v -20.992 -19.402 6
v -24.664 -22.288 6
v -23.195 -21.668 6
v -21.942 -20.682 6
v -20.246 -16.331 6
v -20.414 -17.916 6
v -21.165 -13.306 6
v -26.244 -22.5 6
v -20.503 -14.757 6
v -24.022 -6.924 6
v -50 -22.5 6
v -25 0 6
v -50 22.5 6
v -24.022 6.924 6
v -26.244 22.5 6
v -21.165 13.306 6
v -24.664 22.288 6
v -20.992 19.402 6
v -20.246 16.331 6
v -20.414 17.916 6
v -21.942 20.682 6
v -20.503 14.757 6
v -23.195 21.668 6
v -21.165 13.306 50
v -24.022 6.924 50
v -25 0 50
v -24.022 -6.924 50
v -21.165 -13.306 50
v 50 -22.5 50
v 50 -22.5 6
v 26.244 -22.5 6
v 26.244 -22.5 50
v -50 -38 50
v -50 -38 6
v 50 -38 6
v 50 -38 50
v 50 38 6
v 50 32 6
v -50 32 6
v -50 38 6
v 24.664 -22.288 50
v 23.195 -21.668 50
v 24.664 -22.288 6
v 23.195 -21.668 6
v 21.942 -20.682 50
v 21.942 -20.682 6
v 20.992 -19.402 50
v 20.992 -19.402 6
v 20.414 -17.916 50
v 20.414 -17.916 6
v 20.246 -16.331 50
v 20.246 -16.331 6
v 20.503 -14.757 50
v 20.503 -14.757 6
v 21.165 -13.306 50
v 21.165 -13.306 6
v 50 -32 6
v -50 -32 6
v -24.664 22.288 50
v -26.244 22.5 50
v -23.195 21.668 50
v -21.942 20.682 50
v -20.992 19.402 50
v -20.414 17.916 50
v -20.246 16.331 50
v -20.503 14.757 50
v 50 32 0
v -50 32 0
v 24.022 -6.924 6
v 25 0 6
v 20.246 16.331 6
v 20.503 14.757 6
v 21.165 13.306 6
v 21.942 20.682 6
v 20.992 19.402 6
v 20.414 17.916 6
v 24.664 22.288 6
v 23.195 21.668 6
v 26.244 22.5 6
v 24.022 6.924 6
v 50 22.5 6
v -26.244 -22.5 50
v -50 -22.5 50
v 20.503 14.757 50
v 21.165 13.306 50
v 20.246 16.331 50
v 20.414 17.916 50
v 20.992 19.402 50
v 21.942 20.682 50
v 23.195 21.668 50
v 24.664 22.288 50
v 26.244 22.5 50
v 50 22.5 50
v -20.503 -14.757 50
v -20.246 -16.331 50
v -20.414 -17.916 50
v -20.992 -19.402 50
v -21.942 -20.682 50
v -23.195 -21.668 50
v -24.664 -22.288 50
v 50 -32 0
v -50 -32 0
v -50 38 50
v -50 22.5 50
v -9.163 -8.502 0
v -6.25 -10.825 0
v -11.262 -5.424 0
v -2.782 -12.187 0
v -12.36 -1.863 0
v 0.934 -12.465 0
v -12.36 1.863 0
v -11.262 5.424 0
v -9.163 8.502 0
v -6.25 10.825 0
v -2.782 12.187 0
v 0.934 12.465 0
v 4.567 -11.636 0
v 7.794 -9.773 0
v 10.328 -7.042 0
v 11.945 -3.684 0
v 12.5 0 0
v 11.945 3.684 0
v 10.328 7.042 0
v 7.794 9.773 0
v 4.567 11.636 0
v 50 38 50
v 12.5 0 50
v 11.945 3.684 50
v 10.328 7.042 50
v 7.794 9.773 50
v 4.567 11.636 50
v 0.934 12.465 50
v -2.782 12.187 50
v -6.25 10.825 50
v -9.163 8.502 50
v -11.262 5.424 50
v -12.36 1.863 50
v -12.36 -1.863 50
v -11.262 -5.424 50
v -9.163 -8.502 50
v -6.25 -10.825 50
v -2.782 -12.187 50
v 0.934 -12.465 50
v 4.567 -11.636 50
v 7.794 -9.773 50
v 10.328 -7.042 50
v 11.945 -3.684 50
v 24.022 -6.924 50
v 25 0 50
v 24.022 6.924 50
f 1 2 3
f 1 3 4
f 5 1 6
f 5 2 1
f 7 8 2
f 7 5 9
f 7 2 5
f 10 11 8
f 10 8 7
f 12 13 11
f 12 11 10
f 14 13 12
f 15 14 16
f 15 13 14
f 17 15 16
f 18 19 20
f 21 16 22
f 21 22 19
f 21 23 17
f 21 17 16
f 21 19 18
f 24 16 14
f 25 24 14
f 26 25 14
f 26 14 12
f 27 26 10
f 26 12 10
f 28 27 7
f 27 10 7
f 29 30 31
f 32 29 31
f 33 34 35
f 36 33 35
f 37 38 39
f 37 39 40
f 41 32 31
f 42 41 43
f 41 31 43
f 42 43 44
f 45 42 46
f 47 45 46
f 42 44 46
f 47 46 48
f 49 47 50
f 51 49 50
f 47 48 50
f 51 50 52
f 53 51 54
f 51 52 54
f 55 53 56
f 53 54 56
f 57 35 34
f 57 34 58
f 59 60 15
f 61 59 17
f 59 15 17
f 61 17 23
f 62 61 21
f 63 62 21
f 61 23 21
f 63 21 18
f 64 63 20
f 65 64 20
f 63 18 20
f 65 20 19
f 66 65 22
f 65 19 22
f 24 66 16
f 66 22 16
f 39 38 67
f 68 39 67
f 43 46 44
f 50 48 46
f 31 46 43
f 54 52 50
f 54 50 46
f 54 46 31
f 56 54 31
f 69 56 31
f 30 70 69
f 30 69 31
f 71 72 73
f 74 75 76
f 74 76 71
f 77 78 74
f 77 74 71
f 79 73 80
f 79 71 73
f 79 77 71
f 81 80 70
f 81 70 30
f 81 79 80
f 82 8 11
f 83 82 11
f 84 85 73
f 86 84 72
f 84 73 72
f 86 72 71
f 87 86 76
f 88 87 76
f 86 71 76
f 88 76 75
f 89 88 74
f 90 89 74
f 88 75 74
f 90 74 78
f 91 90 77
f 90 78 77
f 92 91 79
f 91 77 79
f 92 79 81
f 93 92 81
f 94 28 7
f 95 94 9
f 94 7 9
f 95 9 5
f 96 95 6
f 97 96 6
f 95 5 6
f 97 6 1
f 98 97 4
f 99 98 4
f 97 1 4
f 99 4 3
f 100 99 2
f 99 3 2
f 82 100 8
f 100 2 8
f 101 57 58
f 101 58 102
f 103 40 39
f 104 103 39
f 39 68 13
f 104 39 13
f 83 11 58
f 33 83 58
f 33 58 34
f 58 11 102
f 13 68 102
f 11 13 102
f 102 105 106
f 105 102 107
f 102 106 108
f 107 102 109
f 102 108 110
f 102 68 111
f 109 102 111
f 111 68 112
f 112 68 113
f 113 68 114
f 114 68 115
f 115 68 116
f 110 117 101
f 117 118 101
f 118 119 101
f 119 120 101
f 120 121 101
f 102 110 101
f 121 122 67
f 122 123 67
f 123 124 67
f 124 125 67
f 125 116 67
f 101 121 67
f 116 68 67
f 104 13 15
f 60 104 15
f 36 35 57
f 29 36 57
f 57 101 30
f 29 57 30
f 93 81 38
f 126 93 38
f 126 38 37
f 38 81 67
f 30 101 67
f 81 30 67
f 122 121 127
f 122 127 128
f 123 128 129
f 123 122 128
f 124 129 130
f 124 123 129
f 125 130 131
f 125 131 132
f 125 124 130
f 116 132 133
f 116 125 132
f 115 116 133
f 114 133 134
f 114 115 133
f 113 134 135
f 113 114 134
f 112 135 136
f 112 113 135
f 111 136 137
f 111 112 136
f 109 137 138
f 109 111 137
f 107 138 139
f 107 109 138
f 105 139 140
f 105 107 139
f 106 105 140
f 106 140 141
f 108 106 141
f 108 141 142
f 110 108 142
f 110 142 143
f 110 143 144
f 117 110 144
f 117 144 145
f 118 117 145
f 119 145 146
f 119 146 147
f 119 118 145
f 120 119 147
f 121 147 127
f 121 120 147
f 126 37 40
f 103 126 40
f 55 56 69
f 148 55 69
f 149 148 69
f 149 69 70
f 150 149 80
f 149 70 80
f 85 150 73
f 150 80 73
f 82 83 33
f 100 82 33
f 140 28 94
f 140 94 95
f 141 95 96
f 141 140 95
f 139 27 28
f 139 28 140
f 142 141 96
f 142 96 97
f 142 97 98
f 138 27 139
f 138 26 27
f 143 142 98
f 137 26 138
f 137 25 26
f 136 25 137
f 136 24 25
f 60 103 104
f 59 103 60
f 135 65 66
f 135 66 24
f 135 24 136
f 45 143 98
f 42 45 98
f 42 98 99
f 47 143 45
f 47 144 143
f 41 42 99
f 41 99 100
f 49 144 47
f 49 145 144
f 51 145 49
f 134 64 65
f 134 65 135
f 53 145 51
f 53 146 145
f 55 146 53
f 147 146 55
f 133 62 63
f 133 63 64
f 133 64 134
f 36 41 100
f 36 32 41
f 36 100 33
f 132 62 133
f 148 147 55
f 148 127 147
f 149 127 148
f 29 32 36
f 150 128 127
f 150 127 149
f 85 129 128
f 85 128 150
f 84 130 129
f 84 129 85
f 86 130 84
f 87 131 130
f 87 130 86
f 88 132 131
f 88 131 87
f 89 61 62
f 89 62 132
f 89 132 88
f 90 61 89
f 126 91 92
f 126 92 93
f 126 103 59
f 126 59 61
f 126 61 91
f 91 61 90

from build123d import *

# Parameters (mm, degrees)
SKETCH1_R           = 12.5
BOSS_EXTRUDE1_DEPTH = 50
BOSS_EXTRUDE2_DEPTH = 6
SKETCH3_W           = 6
SKETCH3_H           = 6
CUT_EXTRUDE1_DEPTH  = 119.084715353


with BuildPart() as part:
    # Sketch1 → Boss-Extrude1 (new body)
    with BuildSketch(Plane.XY):
        with BuildLine():
            ThreePointArc((21.164553987, 13.306451613), (20.992319118, 19.401612455), (26.244046944, 22.5))
            Line((26.244046944, 22.5), (50, 22.5))
            Line((50, 22.5), (50, 38))
            Line((50, 38), (-50, 38))
            Line((-50, 38), (-50, 22.5))
            Line((-50, 22.5), (-26.244046944, 22.5))
            ThreePointArc((-26.244046944, 22.5), (-20.992319118, 19.401612455), (-21.164553987, 13.306451613))
            ThreePointArc((-21.164553987, 13.306451613), (-25, 0), (-21.164553987, -13.306451613))
            ThreePointArc((-21.164553987, -13.306451613), (-20.992319118, -19.401612455), (-26.244046944, -22.5))
            Line((-26.244046944, -22.5), (-50, -22.5))
            Line((-50, -22.5), (-50, -38))
            Line((-50, -38), (50, -38))
            Line((50, -38), (50, -22.5))
            Line((50, -22.5), (26.244046944, -22.5))
            ThreePointArc((26.244046944, -22.5), (20.992319118, -19.401612455), (21.164553987, -13.306451613))
            ThreePointArc((21.164553987, -13.306451613), (25, 0), (21.164553987, 13.306451613))
        make_face()
        Circle(SKETCH1_R, mode=Mode.SUBTRACT)
    extrude(amount=BOSS_EXTRUDE1_DEPTH)

    # Sketch2 → Boss-Extrude2 (add)
    with BuildSketch(Plane(origin=(0, 0, 0), x_dir=(-1, 0, 0), z_dir=(0, 0, -1))):
        with BuildLine():
            Line((50, -22.5), (26.244046944, -22.5))
            ThreePointArc((26.244046944, -22.5), (20.992319118, -19.401612455), (21.164553987, -13.306451613))
            ThreePointArc((21.164553987, -13.306451613), (25, 0), (21.164553987, 13.306451613))
            ThreePointArc((21.164553987, 13.306451613), (20.992319118, 19.401612455), (26.244046944, 22.5))
            Line((26.244046944, 22.5), (50, 22.5))
            Line((50, 22.5), (50, -22.5))
        make_face()
        with BuildLine():
            Line((-26.244046944, -22.5), (-50, -22.5))
            Line((-50, -22.5), (-50, 22.5))
            Line((-50, 22.5), (-26.244046944, 22.5))
            ThreePointArc((-26.244046944, 22.5), (-20.992319118, 19.401612455), (-21.164553987, 13.306451613))
            ThreePointArc((-21.164553987, 13.306451613), (-25, 0), (-21.164553987, -13.306451613))
            ThreePointArc((-21.164553987, -13.306451613), (-20.992319118, -19.401612455), (-26.244046944, -22.5))
        make_face()
    extrude(amount=-BOSS_EXTRUDE2_DEPTH)

    # Sketch3 → Cut-Extrude1 (cut, through all)
    with BuildSketch(Plane(origin=(50, 0, 0), x_dir=(0, 0, -1), z_dir=(1, 0, 0))):
        with Locations((-3, 35)):
            Rectangle(SKETCH3_W, SKETCH3_H)
        with Locations((-3, -35)):
            Rectangle(SKETCH3_W, SKETCH3_H)
    extrude(amount=-CUT_EXTRUDE1_DEPTH, mode=Mode.SUBTRACT)


solid = part.part
